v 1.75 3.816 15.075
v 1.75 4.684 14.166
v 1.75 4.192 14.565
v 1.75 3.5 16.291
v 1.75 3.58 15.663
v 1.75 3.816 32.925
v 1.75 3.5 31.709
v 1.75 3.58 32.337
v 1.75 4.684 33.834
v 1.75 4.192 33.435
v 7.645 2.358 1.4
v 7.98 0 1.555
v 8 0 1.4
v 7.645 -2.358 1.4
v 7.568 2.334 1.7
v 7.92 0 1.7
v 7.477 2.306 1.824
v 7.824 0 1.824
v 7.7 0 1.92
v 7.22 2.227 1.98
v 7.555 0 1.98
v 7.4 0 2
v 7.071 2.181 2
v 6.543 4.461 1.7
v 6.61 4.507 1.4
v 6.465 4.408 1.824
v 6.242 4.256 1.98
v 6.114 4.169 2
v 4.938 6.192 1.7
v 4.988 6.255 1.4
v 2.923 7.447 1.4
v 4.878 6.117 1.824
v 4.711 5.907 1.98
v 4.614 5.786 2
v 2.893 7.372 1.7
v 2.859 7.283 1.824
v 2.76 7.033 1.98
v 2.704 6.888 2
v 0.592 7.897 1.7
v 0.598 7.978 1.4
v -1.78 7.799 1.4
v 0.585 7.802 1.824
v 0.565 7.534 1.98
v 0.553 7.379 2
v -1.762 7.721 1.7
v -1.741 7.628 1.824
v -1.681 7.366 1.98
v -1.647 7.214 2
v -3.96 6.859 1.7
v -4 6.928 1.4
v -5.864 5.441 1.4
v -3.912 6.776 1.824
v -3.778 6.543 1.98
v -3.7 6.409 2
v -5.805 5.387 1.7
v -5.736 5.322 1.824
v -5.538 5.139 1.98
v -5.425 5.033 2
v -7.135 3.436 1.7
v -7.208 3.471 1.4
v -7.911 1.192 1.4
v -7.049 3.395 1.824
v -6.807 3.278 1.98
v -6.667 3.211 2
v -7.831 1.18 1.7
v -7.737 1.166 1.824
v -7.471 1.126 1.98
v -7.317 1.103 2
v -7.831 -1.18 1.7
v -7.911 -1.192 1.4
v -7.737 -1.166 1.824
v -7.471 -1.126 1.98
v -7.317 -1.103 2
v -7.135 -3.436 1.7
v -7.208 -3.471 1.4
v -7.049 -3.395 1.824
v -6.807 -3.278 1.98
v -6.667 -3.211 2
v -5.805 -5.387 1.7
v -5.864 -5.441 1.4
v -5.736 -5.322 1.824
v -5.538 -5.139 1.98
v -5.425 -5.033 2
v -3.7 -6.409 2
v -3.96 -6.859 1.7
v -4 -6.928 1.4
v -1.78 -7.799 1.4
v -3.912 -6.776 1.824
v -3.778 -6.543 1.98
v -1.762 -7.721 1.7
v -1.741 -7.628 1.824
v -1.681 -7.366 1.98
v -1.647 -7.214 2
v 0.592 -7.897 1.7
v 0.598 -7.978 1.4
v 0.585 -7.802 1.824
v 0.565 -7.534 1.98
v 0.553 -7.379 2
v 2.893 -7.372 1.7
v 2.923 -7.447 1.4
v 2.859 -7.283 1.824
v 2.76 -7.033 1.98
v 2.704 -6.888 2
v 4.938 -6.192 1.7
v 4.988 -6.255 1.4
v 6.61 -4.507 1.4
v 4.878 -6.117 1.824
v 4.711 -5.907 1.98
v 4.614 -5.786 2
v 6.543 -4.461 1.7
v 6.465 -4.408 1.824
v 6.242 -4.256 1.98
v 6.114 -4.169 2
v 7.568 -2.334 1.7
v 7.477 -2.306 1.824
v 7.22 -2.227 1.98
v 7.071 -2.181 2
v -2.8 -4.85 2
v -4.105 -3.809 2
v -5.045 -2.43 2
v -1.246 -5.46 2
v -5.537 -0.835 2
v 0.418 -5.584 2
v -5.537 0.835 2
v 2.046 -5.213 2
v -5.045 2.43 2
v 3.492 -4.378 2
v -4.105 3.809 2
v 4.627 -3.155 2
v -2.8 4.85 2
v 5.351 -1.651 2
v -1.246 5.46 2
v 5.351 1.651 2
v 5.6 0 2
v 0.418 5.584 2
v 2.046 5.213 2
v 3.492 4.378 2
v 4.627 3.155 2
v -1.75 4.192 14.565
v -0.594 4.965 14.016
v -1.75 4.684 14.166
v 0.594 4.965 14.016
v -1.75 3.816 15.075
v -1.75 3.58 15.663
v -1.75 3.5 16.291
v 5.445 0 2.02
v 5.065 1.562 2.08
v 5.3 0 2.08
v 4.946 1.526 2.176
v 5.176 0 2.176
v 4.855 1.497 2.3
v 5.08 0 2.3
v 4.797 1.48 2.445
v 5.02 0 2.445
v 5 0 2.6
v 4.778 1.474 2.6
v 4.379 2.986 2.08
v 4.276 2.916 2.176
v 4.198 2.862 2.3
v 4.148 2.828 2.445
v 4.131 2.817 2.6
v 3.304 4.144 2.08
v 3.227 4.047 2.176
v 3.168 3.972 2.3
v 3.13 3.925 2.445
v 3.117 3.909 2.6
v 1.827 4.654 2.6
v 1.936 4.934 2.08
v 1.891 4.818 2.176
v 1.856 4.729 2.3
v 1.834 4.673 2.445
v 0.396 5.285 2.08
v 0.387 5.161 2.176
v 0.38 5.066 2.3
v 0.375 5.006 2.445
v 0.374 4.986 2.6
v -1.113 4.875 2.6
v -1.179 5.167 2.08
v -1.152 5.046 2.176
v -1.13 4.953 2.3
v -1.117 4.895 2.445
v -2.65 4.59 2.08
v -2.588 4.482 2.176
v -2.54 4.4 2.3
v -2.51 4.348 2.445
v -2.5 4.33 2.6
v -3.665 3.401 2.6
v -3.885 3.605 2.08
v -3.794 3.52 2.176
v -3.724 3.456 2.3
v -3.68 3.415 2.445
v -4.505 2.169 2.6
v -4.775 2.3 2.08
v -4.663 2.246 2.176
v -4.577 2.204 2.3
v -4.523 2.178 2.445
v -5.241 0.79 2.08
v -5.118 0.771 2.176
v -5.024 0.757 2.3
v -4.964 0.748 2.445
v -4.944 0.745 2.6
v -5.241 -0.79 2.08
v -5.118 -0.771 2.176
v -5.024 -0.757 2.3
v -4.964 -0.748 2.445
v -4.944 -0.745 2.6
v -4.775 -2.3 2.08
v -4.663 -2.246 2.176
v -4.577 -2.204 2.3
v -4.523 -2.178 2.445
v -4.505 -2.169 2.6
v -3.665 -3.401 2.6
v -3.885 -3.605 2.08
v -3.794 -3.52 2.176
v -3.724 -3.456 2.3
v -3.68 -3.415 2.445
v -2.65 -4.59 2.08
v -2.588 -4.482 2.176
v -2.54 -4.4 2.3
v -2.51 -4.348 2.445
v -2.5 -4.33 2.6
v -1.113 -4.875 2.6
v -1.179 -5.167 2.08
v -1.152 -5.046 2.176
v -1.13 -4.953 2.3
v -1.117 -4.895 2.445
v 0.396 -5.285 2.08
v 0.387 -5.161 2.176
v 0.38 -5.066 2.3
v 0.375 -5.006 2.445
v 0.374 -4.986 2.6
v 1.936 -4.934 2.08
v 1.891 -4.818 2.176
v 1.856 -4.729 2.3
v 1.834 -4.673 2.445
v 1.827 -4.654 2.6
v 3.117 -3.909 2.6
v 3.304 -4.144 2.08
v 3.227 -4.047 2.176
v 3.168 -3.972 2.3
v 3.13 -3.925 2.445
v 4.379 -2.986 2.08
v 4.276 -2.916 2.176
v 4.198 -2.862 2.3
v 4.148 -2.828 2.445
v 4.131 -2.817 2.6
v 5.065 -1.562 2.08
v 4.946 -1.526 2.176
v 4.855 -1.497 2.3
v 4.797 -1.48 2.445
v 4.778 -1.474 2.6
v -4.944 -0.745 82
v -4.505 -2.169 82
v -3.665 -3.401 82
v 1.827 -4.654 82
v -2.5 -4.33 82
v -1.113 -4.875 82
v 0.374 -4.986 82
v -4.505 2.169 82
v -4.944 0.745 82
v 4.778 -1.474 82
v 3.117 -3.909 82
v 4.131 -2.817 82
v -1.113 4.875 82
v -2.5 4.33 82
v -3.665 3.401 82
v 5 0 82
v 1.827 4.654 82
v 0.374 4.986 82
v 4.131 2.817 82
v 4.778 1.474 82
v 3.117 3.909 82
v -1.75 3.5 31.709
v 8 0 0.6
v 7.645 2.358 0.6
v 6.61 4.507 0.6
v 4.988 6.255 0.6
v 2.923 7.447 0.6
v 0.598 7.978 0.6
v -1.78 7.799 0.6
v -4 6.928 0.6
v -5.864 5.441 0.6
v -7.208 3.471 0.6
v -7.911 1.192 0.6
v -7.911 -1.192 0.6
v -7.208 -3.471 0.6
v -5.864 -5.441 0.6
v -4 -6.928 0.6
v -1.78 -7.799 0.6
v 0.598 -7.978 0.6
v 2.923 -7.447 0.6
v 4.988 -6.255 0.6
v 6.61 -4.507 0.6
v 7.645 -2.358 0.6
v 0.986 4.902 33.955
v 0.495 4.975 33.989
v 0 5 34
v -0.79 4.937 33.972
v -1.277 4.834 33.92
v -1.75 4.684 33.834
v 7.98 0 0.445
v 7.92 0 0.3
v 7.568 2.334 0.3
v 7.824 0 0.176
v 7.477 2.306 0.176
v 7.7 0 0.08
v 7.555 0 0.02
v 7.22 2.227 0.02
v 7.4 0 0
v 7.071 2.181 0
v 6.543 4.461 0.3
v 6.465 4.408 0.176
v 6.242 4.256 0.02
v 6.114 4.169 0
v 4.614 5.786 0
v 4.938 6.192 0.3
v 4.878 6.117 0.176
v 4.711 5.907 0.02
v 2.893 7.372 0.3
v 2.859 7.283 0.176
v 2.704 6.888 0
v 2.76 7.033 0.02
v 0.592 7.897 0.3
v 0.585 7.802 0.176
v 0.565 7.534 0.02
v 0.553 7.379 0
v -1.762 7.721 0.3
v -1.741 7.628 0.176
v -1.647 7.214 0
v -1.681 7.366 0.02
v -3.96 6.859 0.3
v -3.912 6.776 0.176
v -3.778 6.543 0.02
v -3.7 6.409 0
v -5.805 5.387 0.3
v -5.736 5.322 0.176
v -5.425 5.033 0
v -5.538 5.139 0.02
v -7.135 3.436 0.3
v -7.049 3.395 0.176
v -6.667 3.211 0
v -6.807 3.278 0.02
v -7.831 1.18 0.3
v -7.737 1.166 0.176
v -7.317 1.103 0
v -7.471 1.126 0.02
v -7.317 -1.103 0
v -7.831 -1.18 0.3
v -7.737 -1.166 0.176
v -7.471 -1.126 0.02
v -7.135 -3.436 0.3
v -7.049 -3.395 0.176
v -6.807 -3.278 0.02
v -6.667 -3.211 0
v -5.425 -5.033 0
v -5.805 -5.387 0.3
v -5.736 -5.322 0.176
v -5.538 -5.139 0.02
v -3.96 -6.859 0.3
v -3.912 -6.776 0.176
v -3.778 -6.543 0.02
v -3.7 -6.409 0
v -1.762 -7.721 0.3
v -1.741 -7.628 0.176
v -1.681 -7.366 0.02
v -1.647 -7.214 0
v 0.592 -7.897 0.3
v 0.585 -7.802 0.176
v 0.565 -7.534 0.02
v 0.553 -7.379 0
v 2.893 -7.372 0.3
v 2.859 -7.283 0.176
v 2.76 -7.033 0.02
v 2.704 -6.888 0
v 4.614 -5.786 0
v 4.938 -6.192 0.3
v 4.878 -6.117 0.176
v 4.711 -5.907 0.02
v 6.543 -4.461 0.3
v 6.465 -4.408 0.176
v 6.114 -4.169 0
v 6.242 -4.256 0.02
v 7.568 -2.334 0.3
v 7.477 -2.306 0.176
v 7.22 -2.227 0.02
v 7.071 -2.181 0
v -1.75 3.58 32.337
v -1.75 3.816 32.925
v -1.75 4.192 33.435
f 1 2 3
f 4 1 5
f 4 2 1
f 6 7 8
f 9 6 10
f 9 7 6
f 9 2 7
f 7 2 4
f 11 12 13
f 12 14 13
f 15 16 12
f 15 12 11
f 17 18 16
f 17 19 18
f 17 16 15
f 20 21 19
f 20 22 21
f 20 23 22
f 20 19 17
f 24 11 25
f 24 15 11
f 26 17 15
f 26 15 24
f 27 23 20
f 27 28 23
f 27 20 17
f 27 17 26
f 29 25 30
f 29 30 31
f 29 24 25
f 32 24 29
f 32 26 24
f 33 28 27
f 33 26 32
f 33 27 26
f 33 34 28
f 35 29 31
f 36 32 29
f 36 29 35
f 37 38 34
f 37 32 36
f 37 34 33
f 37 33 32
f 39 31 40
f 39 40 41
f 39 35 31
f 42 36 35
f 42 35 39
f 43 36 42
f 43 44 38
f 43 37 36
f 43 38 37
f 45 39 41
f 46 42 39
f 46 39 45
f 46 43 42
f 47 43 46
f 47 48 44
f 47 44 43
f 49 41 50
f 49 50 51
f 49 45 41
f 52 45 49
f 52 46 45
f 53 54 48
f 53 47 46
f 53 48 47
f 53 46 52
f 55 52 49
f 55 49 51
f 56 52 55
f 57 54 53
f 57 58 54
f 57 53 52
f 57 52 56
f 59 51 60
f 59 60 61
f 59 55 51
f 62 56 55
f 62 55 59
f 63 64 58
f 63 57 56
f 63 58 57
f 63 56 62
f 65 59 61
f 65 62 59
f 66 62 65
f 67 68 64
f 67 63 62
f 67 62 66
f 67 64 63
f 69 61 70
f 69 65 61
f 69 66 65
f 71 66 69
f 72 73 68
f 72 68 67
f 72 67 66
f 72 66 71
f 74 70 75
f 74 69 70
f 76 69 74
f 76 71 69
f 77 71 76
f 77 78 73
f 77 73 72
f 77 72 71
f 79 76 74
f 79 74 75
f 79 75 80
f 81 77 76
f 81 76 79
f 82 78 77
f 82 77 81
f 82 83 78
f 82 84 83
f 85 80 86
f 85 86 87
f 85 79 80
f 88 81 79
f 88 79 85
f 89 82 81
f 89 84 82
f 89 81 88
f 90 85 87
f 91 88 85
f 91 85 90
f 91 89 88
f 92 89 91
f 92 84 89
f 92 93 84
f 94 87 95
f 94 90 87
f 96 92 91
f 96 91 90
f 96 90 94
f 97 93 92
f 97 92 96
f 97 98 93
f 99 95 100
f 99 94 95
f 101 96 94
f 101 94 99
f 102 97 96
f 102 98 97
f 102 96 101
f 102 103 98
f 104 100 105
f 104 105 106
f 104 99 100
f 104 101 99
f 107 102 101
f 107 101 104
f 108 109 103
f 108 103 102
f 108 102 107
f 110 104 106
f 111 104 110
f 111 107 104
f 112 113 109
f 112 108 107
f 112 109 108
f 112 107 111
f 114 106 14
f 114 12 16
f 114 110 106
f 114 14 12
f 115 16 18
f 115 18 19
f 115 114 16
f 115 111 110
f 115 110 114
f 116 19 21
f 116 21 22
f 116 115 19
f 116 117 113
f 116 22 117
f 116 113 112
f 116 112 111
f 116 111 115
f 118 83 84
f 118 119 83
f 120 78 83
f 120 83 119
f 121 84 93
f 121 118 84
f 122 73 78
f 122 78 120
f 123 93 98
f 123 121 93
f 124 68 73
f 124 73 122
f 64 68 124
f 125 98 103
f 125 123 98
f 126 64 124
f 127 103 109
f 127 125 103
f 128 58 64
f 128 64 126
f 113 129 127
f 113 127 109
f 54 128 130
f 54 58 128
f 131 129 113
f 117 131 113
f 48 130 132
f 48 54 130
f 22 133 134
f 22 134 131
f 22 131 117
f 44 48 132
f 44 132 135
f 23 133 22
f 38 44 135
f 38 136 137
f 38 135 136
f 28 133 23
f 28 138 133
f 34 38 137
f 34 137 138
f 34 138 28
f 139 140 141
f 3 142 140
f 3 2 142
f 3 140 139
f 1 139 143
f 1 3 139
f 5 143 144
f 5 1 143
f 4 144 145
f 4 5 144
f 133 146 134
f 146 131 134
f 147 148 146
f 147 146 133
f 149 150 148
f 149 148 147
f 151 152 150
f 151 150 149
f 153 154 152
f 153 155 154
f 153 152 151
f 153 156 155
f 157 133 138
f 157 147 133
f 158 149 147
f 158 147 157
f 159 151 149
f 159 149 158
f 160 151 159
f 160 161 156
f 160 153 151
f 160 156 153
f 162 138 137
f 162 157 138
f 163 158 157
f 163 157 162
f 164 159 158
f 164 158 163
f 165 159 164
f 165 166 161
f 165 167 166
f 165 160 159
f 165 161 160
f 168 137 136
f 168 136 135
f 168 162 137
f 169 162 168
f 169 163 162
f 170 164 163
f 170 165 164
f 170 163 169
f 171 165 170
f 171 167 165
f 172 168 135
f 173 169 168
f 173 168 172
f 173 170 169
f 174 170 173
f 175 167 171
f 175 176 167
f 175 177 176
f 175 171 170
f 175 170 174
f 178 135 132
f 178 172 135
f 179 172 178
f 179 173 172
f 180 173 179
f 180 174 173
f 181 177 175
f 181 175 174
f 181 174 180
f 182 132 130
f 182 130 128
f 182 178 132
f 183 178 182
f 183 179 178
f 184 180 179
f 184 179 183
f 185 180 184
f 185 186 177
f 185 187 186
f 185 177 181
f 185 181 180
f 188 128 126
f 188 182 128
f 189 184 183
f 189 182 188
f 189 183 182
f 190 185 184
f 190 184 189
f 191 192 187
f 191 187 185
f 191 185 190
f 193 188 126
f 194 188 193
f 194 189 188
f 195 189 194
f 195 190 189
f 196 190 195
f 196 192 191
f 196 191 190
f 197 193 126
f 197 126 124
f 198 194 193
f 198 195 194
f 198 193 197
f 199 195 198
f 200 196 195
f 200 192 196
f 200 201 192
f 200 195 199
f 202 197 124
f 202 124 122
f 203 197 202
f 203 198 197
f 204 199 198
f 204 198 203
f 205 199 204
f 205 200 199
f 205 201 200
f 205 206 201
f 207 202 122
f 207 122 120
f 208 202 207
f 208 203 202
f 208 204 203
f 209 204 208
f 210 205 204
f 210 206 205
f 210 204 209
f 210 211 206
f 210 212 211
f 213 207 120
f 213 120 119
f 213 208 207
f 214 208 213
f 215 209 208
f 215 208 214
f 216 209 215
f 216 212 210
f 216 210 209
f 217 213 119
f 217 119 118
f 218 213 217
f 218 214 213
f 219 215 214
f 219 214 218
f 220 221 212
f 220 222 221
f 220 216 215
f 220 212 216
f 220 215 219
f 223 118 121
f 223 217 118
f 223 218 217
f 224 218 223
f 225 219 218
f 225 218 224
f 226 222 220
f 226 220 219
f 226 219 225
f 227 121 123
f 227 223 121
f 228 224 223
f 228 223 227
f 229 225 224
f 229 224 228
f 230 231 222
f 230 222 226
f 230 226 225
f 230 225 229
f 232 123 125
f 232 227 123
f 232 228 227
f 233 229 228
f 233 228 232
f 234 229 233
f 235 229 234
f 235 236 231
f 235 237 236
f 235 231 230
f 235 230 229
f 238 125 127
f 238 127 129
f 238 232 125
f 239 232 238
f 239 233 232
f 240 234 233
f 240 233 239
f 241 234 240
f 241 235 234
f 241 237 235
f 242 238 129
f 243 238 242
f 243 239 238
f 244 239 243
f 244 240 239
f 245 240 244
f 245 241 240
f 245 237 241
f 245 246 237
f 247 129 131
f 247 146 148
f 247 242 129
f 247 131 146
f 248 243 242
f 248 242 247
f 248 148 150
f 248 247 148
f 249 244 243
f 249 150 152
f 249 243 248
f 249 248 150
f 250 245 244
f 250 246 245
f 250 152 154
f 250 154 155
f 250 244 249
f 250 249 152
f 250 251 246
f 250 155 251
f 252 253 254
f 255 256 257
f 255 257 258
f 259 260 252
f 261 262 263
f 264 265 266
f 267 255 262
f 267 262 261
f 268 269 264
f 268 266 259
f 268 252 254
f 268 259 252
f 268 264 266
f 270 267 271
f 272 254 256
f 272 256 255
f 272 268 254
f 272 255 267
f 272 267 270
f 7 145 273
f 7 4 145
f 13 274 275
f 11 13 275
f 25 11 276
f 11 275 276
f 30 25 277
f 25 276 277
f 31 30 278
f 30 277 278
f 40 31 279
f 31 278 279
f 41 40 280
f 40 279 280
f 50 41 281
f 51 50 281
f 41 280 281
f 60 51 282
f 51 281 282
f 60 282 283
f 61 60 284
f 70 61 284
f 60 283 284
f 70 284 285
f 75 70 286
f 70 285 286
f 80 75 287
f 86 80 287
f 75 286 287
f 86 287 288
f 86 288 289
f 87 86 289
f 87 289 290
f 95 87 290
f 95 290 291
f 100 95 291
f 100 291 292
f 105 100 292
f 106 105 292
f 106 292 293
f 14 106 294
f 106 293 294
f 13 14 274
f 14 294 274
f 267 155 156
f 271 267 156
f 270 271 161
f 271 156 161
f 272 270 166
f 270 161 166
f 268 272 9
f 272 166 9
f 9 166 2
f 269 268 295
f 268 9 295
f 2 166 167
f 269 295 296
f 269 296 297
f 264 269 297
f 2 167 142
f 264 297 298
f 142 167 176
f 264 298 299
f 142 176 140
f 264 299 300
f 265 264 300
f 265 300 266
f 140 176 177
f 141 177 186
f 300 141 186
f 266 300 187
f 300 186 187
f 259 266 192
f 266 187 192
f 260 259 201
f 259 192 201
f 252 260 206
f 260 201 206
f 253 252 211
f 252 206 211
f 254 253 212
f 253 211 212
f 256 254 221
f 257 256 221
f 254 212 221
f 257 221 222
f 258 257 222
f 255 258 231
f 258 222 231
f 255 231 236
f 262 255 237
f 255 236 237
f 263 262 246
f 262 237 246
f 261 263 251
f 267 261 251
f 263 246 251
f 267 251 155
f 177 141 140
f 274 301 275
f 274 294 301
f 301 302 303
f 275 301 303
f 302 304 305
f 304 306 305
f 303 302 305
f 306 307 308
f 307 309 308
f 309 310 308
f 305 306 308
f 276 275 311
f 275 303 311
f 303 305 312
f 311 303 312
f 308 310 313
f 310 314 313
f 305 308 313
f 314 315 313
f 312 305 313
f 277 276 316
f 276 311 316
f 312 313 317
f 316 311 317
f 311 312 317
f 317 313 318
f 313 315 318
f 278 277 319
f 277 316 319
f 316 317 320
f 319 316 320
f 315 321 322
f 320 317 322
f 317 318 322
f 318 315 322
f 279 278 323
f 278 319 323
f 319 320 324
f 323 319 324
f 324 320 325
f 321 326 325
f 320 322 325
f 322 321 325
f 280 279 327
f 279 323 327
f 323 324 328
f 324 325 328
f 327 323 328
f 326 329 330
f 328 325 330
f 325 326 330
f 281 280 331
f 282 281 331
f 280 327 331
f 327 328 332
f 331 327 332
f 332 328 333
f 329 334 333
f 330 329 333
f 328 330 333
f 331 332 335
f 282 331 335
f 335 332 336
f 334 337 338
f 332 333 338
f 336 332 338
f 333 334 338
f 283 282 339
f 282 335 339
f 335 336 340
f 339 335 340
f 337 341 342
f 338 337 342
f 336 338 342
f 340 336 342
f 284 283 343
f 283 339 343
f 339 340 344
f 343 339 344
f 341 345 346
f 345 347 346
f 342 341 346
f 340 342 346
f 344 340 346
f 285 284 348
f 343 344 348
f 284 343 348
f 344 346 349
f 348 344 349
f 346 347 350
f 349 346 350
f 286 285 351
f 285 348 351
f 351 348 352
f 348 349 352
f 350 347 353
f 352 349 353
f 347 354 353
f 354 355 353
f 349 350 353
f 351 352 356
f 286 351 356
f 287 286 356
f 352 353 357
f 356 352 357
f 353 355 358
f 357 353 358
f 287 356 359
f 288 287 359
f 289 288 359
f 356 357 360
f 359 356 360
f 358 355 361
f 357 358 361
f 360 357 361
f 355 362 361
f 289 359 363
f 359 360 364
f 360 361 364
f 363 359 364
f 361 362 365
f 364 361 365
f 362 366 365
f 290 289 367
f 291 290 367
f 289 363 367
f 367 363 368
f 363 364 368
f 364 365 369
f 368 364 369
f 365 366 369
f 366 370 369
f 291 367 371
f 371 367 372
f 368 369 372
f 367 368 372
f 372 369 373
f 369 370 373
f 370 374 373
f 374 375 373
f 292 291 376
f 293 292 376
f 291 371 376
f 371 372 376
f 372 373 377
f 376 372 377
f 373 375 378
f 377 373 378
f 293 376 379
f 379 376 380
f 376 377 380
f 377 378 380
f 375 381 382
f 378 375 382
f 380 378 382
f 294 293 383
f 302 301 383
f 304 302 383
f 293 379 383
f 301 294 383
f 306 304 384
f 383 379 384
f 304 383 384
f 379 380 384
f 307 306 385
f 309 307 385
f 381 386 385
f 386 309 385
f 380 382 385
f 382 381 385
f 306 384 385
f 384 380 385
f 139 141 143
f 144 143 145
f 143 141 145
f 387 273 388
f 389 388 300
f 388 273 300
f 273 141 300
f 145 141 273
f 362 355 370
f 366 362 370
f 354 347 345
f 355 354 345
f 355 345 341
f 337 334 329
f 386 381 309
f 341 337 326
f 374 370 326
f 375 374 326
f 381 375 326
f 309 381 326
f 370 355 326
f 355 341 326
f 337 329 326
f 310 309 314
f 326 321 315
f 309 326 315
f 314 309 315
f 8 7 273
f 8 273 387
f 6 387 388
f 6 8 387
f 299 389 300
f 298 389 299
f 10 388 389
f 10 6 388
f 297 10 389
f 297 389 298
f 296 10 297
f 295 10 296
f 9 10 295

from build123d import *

# Parameters (mm, degrees)
SKETCH1_R           = 8
BOSS_EXTRUDE1_DEPTH = 2
SKETCH2_R           = 5
BOSS_EXTRUDE2_DEPTH = 80
CUT_EXTRUDE1_DEPTH  = 1.75
FILLET2_R           = 0.6


with BuildPart() as part:
    # Sketch1 → Boss-Extrude1 (new body)
    with BuildSketch(Plane.XY):
        Circle(SKETCH1_R)
    extrude(amount=BOSS_EXTRUDE1_DEPTH)

    # Sketch2 → Boss-Extrude2 (add)
    with BuildSketch(Plane.XY.offset(2)):
        Circle(SKETCH2_R)
    extrude(amount=BOSS_EXTRUDE2_DEPTH)

    # Sketch4 → Cut-Extrude1 (cut, symmetric)
    with BuildSketch(Plane(origin=(0, 0, 0), x_dir=(0, 0, -1), z_dir=(1, 0, 0))):
        with BuildLine():
            Line((-34, 5), (-14, 5))
            ThreePointArc((-14, 5), (-14.921981454, 3.908349934), (-16.291287847, 3.5))
            Line((-16.291287847, 3.5), (-31.708712153, 3.5))
            ThreePointArc((-31.708712153, 3.5), (-33.078018546, 3.908349934), (-34, 5))
        make_face()
    extrude(amount=CUT_EXTRUDE1_DEPTH, both=True, mode=Mode.SUBTRACT)

    # Fillet2
    fillet2_edges = [part.edges().sort_by_distance(p)[0] for p in [
        (-8, 0, 0),
        (-8, 0, 2),
        (-5, 0, 2),
    ]]
    fillet(fillet2_edges, radius=FILLET2_R)


solid = part.part
